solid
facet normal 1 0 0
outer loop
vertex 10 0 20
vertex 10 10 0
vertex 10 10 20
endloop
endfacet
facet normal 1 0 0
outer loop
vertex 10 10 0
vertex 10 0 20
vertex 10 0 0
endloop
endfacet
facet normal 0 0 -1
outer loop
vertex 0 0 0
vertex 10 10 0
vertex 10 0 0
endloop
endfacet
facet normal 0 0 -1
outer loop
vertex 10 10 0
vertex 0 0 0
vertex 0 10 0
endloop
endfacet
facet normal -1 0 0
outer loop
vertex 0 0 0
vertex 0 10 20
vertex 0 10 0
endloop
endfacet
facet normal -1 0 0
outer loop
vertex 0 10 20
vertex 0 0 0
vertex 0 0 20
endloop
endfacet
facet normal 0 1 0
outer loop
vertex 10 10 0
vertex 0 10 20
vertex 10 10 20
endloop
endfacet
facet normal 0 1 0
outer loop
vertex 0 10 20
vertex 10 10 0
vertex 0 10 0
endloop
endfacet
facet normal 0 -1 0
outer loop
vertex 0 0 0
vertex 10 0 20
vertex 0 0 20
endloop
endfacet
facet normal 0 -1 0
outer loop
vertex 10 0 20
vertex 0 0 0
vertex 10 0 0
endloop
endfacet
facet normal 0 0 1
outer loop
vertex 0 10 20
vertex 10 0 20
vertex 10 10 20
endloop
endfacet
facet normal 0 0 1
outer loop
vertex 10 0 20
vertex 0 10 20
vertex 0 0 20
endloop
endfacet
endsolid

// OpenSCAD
// SPDX-License-Identifier: AGPL-3.0-or-later
// Two stacked cubes of different colors for testing multi-color 3MF.
// The red cube sits on the bed (Z=0..10) and the white cube sits on top (Z=10..20).

/* [Dimensions] */
// Size of each cube in mm
size = 10; // [5:1:50]

/* [Colors] */
// Color of the bottom cube
bottom_color = "red";
// Color of the top cube
top_color = "white";

color(bottom_color) cube([size, size, size]);
color(top_color) translate([0, 0, size]) cube([size, size, size]);
